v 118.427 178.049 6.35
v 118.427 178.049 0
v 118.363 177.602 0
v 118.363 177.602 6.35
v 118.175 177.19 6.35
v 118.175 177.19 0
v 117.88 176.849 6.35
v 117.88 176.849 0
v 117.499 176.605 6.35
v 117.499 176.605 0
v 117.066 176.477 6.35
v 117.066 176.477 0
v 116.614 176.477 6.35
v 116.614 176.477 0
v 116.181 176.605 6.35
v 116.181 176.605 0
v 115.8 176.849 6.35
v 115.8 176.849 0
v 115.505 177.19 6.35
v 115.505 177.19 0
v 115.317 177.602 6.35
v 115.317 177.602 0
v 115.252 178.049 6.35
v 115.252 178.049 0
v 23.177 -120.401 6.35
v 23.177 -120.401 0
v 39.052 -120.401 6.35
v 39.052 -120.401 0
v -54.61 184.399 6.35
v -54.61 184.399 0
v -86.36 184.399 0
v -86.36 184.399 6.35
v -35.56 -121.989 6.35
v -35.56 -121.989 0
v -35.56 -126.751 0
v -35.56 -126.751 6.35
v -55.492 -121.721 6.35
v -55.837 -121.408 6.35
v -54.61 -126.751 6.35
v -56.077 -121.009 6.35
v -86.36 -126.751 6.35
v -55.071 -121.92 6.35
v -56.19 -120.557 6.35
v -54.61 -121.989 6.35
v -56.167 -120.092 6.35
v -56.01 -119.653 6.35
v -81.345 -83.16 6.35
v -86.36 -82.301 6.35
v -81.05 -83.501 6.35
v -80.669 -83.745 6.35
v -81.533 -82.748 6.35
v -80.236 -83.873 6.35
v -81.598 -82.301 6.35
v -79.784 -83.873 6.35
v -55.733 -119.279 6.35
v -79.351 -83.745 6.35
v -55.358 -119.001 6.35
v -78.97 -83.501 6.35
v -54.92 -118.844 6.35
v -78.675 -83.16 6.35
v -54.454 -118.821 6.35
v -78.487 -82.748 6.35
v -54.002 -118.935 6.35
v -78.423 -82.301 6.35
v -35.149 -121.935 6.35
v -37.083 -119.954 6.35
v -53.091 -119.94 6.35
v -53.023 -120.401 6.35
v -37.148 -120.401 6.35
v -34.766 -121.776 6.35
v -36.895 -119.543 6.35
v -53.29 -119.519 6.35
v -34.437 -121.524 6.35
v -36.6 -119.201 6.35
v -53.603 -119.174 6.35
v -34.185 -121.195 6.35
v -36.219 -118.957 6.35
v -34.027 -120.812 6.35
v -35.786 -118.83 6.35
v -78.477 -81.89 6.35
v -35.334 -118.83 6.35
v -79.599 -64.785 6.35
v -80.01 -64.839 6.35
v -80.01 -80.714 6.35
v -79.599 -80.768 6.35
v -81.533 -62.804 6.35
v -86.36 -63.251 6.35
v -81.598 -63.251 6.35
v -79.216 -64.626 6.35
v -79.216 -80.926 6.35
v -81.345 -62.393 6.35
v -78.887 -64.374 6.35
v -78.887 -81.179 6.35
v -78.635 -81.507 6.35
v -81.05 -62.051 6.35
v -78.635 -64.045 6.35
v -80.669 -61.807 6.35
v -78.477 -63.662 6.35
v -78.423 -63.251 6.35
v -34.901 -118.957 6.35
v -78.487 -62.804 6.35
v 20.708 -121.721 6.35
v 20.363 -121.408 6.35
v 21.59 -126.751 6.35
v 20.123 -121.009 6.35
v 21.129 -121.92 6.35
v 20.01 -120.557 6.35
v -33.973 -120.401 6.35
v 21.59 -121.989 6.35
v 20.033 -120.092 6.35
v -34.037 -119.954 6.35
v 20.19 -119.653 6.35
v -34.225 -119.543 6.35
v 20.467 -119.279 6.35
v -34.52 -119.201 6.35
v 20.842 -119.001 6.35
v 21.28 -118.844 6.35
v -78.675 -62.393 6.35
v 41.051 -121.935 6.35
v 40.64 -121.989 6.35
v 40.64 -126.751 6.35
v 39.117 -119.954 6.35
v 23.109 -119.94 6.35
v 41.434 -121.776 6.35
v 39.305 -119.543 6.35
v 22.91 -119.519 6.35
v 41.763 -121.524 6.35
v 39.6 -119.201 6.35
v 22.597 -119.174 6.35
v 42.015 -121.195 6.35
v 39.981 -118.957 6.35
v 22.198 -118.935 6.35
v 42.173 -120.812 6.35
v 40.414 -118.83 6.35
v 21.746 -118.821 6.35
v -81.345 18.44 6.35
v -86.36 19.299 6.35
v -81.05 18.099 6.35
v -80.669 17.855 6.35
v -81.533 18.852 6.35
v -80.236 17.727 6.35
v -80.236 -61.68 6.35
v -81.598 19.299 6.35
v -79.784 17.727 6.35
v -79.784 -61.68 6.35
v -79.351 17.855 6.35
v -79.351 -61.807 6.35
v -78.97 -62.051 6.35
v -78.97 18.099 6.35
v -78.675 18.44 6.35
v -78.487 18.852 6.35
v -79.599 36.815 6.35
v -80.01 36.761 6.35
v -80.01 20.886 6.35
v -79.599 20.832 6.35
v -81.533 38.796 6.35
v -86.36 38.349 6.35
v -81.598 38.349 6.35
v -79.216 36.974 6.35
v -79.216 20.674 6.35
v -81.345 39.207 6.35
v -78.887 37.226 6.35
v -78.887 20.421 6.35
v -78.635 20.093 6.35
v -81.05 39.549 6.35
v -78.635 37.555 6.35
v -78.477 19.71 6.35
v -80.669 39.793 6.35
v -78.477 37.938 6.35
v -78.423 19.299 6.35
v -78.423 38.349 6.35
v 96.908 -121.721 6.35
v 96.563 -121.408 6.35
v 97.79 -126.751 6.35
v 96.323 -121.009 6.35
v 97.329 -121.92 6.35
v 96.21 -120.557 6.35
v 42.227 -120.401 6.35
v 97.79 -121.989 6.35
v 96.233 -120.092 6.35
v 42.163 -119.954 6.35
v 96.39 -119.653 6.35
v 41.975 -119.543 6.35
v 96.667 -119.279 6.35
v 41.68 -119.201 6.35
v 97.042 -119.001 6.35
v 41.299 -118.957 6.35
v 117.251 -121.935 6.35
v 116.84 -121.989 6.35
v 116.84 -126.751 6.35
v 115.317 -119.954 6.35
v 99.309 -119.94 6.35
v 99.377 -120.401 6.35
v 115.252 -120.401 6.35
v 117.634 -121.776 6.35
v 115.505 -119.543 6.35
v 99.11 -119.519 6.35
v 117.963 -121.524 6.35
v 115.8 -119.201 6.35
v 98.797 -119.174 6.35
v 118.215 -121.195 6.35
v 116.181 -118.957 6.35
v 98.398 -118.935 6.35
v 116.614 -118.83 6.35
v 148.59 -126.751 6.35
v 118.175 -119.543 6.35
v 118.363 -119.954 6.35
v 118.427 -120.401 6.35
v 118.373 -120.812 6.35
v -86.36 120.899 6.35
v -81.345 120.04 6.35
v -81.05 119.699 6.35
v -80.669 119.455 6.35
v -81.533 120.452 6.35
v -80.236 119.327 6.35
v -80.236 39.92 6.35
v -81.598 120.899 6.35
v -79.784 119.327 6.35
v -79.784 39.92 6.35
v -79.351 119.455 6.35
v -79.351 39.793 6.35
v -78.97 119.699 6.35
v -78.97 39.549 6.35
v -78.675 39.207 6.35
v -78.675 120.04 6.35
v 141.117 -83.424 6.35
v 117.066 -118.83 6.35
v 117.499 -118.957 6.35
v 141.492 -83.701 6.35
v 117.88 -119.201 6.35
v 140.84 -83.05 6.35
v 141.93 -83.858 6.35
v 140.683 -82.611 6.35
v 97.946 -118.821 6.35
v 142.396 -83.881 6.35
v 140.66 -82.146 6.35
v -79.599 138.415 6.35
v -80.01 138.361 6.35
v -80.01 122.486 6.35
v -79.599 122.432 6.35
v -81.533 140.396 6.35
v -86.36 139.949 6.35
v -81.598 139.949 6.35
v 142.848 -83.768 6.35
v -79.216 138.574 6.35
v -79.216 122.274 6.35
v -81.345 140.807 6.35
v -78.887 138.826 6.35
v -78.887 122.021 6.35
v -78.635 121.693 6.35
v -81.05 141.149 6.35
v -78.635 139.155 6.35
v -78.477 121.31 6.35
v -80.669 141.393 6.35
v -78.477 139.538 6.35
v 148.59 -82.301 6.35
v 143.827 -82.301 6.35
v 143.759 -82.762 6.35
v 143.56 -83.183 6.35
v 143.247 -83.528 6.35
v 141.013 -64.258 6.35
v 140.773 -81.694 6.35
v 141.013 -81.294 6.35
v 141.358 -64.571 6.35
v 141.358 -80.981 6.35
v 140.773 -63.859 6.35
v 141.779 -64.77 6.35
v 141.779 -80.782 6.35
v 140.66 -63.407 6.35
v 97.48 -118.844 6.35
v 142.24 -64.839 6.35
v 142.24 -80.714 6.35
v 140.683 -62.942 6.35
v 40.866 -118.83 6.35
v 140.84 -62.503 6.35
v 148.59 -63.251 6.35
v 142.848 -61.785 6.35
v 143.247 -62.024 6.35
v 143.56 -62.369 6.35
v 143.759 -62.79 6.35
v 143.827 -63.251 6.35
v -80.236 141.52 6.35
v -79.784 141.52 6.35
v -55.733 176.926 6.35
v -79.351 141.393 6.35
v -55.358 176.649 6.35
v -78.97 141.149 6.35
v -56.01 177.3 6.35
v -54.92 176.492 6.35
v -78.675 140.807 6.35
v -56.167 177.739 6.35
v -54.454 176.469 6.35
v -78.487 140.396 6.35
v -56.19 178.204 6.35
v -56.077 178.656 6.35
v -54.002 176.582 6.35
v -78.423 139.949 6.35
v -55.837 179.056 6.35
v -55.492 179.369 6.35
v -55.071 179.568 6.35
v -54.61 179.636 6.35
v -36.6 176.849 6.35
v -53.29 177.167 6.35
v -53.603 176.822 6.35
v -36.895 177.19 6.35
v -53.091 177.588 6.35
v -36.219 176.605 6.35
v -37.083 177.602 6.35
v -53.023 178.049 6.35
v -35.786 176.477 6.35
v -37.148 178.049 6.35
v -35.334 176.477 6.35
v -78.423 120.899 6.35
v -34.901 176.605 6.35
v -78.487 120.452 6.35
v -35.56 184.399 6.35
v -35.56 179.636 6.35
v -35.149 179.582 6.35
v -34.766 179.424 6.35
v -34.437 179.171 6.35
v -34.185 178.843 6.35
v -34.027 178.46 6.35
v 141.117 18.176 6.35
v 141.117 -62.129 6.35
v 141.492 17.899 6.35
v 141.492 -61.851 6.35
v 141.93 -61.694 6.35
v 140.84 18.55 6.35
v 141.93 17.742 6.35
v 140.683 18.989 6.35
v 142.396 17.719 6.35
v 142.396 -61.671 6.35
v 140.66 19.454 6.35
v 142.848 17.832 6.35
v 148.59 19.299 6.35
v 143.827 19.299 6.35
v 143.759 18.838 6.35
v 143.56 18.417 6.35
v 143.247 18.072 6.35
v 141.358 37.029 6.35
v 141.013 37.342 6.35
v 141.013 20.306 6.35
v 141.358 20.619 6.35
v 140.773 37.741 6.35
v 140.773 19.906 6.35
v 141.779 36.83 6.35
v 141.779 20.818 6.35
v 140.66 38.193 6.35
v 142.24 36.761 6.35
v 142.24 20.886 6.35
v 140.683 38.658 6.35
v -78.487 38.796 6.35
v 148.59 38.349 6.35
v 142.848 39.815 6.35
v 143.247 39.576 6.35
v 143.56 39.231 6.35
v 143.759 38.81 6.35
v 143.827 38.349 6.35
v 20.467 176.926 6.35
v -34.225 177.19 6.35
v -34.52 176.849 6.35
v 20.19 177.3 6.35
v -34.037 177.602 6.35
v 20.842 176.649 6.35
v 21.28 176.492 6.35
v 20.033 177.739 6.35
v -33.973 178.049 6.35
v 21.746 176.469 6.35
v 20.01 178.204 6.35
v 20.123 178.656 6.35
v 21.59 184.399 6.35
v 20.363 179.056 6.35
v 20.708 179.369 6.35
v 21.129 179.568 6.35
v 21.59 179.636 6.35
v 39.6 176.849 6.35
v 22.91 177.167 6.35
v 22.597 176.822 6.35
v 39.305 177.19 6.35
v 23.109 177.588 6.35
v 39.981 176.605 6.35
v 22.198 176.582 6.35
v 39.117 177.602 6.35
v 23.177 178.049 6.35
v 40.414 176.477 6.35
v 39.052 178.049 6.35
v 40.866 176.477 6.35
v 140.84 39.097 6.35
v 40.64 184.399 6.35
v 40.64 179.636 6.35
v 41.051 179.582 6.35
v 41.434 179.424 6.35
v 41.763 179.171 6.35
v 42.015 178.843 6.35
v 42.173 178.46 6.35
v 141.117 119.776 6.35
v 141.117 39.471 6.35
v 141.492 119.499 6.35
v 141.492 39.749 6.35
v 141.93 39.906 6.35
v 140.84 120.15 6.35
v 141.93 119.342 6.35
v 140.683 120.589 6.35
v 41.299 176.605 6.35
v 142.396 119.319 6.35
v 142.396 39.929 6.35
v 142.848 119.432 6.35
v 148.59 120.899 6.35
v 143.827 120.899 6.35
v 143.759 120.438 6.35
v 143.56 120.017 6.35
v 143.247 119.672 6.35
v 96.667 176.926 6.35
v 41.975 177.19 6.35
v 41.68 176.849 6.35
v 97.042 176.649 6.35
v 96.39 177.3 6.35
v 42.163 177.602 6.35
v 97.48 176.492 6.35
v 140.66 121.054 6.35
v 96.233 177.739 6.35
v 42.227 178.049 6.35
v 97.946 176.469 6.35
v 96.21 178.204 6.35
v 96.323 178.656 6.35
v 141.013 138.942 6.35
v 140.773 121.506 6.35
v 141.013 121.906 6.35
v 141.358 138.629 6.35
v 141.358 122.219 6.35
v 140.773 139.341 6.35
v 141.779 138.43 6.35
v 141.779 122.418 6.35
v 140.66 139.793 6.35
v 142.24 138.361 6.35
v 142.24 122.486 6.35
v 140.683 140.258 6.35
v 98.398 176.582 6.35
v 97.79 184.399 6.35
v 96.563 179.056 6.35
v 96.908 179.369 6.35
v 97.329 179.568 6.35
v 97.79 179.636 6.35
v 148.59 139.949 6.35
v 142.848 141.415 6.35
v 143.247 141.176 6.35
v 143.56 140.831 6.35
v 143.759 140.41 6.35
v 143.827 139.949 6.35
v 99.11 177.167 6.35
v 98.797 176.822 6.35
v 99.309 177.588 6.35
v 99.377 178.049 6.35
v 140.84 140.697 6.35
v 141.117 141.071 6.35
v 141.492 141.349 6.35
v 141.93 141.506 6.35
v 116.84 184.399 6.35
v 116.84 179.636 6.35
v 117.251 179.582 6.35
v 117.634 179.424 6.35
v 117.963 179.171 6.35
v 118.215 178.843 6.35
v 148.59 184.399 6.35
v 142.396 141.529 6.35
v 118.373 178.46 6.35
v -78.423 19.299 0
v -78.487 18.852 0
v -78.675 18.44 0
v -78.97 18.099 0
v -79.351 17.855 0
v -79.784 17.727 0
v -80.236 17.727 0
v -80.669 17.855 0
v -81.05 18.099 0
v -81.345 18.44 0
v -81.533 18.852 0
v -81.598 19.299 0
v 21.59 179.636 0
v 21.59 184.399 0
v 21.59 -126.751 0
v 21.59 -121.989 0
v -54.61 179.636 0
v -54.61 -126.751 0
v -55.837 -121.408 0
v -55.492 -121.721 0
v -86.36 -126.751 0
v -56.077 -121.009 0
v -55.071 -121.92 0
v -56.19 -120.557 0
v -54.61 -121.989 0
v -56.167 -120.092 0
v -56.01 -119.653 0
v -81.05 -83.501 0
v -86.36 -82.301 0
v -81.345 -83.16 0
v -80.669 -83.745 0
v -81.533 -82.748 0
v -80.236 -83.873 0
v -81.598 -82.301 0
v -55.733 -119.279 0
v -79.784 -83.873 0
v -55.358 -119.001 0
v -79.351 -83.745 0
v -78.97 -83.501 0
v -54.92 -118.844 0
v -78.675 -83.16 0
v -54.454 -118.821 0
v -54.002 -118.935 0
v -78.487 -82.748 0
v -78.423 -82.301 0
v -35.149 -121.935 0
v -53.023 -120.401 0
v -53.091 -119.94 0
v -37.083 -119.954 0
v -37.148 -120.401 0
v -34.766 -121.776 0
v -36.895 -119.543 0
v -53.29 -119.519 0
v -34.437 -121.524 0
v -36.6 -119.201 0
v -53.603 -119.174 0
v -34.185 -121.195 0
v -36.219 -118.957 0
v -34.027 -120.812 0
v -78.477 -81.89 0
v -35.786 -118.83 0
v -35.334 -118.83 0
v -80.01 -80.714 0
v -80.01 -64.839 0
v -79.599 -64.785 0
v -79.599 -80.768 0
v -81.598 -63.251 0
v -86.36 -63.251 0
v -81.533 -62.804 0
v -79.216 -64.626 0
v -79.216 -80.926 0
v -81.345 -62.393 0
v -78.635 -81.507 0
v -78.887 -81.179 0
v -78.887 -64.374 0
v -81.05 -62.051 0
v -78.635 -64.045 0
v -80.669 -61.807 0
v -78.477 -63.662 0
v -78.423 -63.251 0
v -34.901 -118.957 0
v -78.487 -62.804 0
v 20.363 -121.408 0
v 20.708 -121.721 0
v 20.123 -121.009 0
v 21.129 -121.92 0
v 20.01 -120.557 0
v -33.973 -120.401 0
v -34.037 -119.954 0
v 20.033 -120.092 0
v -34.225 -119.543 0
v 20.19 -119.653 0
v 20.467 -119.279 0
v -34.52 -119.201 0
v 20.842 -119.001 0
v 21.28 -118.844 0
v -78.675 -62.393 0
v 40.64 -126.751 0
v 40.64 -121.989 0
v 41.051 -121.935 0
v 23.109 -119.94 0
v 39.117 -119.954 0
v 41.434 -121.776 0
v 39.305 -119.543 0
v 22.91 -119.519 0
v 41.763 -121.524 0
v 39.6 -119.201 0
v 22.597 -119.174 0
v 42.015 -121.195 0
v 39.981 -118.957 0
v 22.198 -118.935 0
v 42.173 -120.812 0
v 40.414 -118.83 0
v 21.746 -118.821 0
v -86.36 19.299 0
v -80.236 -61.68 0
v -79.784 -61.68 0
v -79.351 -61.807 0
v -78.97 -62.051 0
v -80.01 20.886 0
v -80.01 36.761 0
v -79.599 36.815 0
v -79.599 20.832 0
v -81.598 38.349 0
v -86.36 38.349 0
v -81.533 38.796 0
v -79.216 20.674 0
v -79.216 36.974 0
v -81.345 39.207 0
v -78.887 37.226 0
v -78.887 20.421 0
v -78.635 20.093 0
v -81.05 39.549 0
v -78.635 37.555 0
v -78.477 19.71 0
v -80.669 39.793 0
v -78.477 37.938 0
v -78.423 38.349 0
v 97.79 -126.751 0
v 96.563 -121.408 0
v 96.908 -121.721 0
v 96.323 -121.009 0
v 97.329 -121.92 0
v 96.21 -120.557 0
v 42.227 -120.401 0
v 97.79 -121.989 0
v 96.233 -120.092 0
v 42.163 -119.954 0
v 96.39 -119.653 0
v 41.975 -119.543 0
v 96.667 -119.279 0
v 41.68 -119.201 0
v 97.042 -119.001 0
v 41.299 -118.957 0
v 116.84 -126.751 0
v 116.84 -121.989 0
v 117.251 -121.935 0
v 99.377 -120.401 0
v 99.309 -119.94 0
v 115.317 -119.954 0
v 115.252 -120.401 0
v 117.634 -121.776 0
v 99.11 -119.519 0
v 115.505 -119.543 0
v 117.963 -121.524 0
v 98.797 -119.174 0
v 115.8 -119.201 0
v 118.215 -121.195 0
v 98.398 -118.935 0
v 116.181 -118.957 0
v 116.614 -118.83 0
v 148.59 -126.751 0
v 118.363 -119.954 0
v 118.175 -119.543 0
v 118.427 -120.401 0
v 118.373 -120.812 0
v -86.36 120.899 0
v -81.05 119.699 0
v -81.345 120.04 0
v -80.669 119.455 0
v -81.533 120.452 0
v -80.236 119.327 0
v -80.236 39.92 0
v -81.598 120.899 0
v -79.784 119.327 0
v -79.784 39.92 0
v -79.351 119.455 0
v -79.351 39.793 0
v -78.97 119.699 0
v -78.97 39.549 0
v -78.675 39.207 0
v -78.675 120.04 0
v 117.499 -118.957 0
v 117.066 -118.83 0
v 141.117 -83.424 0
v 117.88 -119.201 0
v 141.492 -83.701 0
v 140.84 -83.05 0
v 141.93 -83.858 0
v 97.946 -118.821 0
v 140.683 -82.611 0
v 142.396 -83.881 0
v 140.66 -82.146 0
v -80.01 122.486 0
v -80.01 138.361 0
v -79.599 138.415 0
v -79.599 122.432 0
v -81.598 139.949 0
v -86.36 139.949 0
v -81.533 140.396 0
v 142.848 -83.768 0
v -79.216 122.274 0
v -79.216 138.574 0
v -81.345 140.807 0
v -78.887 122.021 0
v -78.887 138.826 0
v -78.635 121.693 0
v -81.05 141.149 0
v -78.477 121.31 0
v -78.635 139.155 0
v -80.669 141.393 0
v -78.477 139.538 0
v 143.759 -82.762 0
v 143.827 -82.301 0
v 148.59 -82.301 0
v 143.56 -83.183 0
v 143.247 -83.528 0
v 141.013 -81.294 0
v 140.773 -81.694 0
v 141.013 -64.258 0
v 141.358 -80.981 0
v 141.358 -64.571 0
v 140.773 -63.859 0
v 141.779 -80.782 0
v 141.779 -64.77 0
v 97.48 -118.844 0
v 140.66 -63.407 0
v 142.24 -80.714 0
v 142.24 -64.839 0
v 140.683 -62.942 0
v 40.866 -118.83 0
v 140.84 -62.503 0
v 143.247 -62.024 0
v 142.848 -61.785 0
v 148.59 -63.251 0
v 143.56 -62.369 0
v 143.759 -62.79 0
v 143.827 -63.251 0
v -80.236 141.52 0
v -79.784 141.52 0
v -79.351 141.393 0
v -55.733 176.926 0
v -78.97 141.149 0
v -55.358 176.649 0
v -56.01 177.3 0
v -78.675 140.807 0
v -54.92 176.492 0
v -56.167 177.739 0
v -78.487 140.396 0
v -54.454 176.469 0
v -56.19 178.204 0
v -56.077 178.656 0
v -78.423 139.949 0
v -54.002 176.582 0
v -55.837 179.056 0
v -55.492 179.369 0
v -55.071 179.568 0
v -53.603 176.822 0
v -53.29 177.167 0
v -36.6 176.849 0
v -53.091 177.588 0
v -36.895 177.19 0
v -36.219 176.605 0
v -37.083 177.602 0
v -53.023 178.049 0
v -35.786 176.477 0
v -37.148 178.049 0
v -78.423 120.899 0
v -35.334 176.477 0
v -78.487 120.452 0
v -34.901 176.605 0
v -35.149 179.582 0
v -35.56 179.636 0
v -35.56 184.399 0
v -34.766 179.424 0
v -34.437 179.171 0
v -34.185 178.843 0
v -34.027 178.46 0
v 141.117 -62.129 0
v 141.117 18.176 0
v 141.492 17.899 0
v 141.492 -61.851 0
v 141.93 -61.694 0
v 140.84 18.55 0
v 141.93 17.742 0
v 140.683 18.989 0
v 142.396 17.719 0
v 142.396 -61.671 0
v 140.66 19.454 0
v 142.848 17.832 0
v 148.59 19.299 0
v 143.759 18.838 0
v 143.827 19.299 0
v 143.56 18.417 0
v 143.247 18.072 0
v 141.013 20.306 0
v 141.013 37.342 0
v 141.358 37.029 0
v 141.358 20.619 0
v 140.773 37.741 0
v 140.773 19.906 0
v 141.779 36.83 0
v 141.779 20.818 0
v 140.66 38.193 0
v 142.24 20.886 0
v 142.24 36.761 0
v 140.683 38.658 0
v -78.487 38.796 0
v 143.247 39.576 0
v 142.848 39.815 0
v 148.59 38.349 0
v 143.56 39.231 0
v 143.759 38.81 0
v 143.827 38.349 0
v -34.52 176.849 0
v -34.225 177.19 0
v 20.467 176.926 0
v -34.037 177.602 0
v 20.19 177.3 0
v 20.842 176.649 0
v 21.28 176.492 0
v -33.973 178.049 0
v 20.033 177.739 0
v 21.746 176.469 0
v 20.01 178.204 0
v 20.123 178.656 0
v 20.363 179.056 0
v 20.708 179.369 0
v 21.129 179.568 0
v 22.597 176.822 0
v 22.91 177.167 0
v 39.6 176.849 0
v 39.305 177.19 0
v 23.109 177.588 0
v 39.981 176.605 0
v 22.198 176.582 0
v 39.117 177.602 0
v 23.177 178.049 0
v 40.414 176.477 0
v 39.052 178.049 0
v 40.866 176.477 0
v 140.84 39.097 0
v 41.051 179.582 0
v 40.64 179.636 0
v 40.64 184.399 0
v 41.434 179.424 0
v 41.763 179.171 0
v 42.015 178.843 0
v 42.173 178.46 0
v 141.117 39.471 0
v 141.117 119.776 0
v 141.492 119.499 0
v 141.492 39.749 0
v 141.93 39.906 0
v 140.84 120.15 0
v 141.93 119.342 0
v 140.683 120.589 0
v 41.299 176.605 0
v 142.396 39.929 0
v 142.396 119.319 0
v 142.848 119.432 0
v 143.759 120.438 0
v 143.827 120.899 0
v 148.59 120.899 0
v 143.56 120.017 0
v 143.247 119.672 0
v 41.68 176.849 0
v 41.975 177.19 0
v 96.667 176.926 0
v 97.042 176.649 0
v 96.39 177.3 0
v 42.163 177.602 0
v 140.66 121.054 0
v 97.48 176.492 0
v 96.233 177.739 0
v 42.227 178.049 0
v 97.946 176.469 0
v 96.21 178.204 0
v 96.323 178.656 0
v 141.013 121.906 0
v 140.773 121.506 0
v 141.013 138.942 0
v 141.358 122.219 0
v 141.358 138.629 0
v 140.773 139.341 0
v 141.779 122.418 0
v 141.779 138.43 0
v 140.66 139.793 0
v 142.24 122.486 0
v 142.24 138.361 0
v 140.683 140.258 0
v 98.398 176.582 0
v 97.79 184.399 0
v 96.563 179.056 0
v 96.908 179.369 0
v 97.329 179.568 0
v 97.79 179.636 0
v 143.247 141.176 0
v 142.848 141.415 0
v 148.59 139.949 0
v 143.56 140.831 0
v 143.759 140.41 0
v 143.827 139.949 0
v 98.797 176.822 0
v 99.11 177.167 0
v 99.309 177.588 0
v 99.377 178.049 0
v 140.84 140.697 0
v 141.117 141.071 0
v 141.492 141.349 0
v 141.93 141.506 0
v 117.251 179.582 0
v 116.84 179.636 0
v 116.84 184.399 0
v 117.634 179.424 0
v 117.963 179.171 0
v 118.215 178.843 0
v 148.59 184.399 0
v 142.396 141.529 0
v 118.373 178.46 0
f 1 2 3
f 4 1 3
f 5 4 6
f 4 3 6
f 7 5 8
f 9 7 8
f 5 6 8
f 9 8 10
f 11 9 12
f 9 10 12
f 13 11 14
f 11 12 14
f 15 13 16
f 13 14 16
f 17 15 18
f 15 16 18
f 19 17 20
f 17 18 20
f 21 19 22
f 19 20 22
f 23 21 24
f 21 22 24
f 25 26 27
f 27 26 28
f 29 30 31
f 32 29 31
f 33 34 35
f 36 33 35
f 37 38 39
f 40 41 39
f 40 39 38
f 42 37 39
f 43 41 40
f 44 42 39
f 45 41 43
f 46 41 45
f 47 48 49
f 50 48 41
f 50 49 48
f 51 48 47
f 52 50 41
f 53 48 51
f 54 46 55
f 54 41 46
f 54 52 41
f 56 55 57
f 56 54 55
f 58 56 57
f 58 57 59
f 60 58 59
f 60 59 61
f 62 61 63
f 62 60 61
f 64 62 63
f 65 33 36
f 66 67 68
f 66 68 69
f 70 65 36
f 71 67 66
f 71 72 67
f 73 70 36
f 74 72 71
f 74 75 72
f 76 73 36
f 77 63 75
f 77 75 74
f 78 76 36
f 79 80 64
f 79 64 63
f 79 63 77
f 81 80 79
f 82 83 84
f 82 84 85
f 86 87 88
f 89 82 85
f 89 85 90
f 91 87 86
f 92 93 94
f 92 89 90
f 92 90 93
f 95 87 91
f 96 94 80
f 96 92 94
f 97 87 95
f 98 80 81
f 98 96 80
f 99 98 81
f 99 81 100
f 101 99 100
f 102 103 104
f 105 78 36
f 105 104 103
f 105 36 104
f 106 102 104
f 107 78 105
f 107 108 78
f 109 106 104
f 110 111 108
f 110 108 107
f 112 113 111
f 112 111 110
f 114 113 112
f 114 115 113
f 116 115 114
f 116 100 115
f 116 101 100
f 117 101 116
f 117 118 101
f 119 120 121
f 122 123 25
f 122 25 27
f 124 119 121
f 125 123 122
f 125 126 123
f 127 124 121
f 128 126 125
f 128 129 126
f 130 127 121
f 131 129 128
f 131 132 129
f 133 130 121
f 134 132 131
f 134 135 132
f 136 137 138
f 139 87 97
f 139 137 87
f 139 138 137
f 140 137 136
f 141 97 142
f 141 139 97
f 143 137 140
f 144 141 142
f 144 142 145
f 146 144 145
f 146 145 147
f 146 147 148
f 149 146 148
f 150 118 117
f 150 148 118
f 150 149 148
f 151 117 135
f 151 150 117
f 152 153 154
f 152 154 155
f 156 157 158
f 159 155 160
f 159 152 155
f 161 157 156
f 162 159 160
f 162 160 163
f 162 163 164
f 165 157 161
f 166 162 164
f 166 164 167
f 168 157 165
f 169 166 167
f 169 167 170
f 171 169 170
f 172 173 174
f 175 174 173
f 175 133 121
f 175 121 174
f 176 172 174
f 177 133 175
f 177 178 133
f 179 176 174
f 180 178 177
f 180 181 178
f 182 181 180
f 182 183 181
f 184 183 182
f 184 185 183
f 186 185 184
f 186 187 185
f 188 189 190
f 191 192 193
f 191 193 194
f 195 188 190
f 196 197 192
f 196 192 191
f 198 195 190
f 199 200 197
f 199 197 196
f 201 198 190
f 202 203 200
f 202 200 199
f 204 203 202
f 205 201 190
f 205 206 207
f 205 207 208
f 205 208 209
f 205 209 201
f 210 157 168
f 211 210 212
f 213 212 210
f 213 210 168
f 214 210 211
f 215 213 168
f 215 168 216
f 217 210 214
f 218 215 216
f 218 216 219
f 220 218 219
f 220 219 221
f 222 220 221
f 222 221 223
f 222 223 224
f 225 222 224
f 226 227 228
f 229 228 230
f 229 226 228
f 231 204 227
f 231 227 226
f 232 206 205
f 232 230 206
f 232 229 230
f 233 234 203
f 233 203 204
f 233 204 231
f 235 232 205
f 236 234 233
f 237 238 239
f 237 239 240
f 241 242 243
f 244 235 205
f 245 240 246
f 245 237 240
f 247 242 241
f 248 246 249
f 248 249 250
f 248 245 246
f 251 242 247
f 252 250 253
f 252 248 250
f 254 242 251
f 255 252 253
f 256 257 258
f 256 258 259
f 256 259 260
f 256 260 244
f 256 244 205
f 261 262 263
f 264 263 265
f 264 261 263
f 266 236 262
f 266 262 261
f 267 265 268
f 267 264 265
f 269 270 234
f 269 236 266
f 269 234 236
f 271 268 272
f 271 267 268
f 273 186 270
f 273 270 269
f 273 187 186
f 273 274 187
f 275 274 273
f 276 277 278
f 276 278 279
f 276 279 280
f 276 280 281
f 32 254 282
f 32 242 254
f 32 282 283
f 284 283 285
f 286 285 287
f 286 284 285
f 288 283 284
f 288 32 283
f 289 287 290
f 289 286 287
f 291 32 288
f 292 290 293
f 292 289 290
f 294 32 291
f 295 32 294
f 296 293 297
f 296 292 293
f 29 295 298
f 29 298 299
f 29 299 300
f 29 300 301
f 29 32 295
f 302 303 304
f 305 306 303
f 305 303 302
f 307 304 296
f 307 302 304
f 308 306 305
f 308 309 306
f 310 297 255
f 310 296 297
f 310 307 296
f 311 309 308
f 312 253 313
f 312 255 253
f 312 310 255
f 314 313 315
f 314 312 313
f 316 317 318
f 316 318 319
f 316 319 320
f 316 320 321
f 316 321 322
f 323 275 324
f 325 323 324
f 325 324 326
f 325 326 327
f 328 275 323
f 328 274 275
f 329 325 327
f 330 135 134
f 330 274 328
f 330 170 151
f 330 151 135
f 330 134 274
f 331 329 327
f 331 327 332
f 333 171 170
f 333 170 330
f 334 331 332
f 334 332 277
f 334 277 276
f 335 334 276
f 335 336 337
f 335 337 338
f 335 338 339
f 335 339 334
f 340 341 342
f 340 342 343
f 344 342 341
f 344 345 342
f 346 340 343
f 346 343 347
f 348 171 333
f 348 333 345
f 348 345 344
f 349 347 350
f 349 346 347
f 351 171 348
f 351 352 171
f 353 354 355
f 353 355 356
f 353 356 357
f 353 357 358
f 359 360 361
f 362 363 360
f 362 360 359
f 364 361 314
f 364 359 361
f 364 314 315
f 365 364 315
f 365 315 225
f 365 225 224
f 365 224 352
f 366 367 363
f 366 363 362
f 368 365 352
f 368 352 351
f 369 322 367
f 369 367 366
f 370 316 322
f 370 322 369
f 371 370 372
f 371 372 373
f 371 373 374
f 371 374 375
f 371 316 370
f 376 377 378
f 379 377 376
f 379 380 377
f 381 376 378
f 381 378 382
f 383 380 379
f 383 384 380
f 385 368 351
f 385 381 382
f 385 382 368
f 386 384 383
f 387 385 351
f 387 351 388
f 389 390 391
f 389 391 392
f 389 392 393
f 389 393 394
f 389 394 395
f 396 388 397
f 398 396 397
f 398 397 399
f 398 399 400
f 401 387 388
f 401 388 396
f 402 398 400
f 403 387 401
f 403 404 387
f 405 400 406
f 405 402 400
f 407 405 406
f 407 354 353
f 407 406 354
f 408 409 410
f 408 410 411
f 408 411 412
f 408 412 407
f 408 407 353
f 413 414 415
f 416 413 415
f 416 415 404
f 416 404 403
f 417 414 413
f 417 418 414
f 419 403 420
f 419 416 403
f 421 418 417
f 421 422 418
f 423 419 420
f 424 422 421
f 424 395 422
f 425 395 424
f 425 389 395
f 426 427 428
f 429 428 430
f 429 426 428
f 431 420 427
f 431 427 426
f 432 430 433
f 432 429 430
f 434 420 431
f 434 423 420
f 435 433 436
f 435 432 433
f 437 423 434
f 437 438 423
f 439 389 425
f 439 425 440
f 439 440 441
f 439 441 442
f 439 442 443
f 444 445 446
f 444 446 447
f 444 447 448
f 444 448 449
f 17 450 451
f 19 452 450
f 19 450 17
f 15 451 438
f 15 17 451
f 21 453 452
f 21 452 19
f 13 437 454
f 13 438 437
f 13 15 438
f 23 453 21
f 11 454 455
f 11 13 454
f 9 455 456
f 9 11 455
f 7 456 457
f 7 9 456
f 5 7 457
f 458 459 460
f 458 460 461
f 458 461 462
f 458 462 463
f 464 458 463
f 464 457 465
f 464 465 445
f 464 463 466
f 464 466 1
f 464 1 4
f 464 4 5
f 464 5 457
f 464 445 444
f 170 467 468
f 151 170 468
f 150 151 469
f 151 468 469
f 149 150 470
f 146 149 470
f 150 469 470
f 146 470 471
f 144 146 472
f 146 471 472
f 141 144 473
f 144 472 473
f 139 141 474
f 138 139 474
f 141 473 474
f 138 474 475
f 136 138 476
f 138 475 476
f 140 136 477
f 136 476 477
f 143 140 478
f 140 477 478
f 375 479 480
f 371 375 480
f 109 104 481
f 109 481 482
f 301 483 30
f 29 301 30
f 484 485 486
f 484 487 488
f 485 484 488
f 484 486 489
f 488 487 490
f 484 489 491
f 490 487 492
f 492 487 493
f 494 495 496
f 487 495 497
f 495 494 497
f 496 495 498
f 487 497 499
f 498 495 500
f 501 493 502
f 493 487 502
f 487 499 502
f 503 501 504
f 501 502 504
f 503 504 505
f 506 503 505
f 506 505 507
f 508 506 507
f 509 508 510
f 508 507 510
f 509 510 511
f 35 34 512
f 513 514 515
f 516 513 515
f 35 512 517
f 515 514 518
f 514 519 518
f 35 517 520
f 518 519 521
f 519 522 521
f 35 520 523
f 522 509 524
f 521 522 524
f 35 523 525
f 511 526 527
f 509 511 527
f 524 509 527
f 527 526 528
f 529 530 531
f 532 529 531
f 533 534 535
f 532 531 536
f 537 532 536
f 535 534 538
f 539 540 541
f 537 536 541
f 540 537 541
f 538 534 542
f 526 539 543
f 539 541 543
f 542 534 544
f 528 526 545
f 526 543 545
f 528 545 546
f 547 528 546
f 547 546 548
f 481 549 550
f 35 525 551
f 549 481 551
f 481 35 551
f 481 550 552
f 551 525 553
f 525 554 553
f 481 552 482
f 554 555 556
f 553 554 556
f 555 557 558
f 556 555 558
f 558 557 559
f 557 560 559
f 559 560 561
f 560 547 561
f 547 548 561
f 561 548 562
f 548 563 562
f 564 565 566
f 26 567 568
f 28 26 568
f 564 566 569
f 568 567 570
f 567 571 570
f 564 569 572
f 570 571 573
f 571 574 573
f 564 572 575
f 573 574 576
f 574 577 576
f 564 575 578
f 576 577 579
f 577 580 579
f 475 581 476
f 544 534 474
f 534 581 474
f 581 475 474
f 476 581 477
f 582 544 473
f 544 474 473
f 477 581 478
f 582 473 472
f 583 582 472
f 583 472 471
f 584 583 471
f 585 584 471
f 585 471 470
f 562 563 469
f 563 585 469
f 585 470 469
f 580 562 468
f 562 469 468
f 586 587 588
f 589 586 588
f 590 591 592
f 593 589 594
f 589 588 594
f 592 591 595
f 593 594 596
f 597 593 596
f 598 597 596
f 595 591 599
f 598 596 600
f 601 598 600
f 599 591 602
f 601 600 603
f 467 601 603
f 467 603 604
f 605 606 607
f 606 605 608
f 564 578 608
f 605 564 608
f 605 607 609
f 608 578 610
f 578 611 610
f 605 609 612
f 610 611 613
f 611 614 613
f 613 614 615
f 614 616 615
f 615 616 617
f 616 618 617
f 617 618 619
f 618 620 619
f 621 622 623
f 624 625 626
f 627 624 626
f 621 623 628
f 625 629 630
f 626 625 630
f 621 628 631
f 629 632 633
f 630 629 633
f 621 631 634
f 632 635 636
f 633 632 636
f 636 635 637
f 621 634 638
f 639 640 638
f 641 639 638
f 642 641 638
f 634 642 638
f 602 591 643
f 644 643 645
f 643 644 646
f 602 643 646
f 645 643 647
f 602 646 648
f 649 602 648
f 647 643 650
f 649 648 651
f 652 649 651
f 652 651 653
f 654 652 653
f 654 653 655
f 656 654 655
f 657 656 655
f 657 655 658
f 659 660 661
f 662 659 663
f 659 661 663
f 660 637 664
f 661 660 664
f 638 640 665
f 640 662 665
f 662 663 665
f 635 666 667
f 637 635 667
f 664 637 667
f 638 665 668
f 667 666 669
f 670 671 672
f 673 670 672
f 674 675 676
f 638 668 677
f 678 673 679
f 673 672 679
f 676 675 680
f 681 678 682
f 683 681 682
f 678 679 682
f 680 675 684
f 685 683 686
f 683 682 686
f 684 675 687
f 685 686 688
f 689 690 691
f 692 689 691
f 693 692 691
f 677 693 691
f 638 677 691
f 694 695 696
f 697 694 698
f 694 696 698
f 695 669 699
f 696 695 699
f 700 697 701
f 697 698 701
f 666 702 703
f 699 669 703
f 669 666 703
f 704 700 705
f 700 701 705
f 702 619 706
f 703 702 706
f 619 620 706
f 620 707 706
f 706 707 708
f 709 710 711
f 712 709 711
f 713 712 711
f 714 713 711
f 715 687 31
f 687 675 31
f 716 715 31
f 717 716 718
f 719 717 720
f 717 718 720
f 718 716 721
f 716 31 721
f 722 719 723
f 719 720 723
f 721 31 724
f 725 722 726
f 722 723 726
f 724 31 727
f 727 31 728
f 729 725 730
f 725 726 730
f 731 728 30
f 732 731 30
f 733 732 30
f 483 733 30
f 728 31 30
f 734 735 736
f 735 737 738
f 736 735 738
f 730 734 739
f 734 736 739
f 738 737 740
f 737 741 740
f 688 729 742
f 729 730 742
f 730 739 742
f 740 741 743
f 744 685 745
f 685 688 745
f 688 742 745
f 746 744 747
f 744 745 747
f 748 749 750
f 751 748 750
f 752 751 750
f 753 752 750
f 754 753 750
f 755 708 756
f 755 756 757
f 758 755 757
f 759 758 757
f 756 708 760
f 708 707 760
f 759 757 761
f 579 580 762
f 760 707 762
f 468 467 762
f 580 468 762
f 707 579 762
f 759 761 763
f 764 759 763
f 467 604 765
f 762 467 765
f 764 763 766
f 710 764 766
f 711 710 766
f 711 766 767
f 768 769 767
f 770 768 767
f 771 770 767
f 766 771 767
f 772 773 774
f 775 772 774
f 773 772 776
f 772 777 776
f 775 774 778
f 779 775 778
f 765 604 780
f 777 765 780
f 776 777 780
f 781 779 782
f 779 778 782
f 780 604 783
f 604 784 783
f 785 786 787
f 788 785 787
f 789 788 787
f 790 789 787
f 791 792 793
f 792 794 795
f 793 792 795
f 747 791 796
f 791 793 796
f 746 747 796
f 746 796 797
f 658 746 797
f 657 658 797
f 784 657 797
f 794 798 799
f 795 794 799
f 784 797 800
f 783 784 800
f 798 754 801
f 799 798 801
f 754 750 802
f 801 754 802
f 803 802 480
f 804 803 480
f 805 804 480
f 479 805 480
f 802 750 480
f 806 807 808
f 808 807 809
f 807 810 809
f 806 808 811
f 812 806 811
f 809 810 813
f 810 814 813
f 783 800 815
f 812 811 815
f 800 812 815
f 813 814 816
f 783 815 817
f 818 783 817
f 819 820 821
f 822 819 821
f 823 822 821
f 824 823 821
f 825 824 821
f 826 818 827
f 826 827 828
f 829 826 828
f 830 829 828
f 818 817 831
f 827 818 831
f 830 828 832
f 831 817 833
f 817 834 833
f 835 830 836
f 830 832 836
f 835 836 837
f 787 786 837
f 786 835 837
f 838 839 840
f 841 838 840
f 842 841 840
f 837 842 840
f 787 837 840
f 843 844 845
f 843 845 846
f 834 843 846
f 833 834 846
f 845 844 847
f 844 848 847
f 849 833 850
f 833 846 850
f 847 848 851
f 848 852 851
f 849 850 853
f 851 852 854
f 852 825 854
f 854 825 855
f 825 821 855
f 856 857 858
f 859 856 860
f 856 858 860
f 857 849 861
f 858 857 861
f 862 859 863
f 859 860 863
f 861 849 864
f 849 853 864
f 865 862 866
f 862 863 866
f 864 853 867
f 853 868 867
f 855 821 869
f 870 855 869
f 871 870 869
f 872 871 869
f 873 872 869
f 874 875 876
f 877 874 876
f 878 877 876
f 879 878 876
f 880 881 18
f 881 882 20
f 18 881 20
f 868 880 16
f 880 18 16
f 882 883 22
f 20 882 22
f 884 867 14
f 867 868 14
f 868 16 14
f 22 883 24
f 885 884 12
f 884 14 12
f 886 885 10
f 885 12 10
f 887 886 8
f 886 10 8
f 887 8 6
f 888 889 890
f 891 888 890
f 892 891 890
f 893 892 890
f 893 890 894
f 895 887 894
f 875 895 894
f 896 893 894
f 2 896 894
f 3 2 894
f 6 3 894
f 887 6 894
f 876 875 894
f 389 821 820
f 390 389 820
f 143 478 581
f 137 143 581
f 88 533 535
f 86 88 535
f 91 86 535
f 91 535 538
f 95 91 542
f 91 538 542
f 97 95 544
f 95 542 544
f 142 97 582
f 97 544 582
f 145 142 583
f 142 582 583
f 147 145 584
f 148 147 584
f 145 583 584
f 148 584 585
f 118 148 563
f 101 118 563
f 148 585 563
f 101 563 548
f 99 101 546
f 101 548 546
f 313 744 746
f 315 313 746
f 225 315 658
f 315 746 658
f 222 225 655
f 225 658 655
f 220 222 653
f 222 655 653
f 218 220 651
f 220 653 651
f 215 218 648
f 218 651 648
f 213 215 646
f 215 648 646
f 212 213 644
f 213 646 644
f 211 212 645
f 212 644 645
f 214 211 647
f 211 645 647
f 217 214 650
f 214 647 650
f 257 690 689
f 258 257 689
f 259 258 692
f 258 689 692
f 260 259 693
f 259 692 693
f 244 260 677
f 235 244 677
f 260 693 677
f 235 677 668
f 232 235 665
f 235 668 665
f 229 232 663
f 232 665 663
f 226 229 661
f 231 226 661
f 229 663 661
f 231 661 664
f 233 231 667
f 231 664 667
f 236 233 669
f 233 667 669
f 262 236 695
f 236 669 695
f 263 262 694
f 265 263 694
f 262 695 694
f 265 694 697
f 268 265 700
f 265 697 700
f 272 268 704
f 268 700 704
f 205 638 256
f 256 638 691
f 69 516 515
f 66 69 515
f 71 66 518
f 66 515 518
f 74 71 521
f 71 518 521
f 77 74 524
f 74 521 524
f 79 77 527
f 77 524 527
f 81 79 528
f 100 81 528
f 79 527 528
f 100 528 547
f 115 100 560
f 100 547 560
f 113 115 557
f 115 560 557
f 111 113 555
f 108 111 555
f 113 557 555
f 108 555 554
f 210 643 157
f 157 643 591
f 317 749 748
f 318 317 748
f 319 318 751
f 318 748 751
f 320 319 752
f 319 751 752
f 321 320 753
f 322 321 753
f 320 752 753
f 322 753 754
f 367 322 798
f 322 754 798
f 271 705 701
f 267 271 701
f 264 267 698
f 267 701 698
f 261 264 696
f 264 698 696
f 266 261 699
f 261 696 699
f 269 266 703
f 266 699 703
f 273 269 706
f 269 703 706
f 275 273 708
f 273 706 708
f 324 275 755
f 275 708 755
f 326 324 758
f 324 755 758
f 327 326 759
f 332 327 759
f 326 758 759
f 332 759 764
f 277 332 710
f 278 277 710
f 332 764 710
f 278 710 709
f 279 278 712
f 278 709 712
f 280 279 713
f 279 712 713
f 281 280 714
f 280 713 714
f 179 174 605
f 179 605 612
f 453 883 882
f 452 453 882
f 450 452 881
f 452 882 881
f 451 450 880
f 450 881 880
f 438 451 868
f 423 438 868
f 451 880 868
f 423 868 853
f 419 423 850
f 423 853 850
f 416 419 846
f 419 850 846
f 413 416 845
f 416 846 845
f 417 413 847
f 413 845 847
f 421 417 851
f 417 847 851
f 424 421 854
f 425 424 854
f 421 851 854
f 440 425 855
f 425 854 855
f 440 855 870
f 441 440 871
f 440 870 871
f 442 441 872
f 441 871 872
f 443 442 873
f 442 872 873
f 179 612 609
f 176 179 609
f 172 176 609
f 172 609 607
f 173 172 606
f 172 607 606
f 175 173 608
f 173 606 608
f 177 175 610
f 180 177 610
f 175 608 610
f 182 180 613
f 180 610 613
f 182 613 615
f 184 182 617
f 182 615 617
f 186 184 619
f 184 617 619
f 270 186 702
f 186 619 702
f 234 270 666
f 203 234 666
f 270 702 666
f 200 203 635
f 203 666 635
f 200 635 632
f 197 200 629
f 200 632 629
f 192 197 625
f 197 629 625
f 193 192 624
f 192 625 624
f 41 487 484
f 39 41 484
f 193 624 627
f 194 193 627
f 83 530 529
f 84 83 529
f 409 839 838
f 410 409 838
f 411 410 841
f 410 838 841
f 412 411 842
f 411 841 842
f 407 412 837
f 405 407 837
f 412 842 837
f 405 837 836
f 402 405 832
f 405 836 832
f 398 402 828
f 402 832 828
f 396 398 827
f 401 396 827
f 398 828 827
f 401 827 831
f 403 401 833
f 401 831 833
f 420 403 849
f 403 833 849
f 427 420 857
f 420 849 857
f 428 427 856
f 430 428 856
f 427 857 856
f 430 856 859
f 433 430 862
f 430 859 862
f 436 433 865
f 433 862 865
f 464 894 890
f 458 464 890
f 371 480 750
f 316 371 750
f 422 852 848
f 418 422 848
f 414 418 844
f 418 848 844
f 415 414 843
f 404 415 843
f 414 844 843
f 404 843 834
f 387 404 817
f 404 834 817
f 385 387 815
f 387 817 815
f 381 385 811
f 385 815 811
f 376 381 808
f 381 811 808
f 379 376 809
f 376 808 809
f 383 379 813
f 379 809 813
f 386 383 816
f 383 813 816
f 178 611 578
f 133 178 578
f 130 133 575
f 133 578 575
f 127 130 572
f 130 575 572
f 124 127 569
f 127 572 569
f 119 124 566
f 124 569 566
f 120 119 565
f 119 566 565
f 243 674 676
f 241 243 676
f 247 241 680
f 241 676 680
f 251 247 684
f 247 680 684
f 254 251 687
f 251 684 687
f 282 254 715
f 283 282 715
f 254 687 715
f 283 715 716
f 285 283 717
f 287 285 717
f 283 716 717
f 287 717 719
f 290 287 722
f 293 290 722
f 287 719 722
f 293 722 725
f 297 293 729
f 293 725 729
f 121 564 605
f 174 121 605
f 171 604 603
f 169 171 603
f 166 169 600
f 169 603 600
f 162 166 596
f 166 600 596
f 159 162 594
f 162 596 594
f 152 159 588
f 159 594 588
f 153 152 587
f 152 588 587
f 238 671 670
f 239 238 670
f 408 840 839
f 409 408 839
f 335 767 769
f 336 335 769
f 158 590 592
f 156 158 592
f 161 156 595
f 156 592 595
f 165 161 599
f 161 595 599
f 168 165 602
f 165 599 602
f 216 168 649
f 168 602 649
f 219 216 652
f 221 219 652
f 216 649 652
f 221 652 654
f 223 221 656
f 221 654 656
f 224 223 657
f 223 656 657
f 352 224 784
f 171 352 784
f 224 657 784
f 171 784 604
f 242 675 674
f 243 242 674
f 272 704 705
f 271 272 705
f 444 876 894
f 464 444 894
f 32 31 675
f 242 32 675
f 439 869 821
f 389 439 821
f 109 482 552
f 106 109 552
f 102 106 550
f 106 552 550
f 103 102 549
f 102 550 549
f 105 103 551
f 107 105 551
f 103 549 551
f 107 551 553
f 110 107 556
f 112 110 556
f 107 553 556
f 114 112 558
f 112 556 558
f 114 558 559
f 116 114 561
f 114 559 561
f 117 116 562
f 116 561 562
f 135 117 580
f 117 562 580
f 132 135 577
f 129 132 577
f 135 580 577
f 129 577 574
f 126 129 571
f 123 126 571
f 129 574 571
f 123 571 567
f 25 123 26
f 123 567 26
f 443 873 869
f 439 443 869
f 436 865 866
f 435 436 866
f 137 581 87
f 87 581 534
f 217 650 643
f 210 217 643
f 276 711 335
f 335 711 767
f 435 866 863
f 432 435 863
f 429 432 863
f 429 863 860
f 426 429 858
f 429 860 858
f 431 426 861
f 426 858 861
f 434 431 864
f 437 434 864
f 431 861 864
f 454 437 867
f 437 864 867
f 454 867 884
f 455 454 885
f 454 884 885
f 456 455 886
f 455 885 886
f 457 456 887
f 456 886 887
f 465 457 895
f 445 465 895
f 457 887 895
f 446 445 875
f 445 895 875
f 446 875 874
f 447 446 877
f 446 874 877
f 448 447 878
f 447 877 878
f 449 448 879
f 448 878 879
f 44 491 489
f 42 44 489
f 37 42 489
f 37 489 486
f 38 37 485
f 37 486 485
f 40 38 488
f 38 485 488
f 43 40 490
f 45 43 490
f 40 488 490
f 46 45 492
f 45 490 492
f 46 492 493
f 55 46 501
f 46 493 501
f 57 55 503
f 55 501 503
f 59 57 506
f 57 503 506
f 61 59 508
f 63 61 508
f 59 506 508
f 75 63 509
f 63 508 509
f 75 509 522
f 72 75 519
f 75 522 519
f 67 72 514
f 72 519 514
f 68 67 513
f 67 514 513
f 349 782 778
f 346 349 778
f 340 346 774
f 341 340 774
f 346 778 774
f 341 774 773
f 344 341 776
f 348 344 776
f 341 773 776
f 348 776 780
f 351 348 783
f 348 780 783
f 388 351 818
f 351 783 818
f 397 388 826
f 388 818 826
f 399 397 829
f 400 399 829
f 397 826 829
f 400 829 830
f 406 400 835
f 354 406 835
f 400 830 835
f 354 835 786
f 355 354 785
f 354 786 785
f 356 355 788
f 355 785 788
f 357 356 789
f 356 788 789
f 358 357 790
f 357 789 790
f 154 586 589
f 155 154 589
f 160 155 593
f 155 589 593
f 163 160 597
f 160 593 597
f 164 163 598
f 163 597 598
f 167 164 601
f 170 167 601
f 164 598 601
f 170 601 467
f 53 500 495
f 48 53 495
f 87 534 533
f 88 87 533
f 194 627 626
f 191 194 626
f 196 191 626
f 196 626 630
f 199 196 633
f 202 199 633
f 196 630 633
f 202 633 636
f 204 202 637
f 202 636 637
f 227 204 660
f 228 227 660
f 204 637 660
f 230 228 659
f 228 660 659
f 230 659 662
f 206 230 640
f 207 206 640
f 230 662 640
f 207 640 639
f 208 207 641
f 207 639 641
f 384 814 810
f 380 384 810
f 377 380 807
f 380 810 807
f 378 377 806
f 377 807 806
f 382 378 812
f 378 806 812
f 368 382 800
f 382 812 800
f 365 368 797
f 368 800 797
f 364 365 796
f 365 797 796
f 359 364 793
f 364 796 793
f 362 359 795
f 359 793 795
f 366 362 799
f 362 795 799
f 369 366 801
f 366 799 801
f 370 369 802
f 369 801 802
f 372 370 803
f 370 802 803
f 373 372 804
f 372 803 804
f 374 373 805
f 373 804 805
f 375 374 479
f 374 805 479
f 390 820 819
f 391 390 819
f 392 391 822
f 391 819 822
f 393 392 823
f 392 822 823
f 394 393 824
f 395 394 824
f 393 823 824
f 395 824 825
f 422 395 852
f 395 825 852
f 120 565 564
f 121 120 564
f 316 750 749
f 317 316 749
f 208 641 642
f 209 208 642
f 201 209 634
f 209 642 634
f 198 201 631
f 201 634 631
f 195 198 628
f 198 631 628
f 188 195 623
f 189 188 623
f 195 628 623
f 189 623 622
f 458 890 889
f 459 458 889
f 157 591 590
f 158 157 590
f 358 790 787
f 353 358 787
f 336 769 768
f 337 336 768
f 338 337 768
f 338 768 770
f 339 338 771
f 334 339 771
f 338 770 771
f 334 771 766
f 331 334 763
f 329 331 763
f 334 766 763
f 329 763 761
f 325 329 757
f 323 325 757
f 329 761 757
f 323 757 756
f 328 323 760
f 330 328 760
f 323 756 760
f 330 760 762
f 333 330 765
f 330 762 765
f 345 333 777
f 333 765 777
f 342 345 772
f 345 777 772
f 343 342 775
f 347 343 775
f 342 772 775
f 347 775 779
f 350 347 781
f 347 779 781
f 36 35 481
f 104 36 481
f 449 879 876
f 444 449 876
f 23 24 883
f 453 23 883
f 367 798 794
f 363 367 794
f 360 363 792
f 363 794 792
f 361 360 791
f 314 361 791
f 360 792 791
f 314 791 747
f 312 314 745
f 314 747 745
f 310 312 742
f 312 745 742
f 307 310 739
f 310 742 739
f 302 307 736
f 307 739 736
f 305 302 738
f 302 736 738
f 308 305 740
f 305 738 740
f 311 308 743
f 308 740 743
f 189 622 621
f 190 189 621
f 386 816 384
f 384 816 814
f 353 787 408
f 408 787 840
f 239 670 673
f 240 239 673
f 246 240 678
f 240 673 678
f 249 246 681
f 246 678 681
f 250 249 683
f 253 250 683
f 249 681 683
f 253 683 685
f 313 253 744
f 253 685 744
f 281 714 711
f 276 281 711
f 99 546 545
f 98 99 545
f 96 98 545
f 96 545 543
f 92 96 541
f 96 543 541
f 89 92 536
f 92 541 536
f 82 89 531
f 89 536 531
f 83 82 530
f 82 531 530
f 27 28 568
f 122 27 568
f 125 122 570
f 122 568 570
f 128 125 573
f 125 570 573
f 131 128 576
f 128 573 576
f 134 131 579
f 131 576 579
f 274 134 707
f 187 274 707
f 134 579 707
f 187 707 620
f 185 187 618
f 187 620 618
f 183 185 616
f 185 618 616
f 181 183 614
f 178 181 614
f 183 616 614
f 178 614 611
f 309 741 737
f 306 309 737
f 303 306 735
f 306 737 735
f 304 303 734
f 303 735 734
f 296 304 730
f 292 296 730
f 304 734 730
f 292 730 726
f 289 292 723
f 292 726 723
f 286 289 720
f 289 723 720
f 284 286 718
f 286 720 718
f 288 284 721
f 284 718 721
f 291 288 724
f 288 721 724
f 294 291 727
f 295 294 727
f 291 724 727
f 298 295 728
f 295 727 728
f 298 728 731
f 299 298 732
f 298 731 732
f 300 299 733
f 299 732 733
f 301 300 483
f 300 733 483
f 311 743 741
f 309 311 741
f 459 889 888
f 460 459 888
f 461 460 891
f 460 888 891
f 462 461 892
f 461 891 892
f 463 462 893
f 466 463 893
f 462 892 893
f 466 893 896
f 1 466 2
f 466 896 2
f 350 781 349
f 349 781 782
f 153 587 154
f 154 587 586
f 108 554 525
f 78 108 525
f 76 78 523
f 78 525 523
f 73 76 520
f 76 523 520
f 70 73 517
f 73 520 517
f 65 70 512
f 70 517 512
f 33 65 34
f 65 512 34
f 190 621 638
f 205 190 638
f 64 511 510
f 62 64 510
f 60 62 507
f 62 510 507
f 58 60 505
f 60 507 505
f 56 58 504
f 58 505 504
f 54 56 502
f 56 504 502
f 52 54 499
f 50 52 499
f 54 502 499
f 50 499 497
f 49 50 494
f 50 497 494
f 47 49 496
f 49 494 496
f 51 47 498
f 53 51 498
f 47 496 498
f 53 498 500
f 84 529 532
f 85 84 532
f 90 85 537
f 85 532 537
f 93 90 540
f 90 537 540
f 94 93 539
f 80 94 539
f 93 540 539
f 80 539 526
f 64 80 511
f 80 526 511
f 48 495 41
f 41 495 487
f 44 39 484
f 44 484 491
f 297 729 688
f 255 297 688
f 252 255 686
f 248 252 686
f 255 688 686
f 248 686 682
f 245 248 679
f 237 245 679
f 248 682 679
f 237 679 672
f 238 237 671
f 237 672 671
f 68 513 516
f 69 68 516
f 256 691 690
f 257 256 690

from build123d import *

# Parameters (mm, degrees)
F1_DEPTH = 6.35


with BuildPart() as f1:
    # F0 (on Top) → F1 (new body)
    with BuildSketch(Plane.XY):
        with BuildLine():
            Line((-54.6100006601, 184.3987628429), (-86.3600006601, 184.3987628429))
            Line((-86.3600006601, 184.3987628429), (-86.3600006601, 139.9487628429))
            Line((-86.3600006601, 139.9487628429), (-81.5975006601, 139.9487628429))
            ThreePointArc((-81.5975006601, 139.9487628429), (-80.0100006601, 141.5362628429), (-78.4225006601, 139.9487628429))
            ThreePointArc((-78.4225006601, 139.9487628429), (-78.887468645, 138.8262308277), (-80.0100006601, 138.3612628429))
            Line((-80.0100006601, 138.3612628429), (-80.0100006601, 122.4862628429))
            ThreePointArc((-80.0100006601, 122.4862628429), (-78.887468645, 122.021294858), (-78.4225006601, 120.8987628429))
            ThreePointArc((-78.4225006601, 120.8987628429), (-80.0100006601, 119.3112628429), (-81.5975006601, 120.8987628429))
            Line((-81.5975006601, 120.8987628429), (-86.3600006601, 120.8987628429))
            Line((-86.3600006601, 120.8987628429), (-86.3600006601, 38.3487628429))
            Line((-86.3600006601, 38.3487628429), (-81.5975006601, 38.3487628429))
            ThreePointArc((-81.5975006601, 38.3487628429), (-80.0100006601, 39.9362628429), (-78.4225006601, 38.3487628429))
            ThreePointArc((-78.4225006601, 38.3487628429), (-78.887468645, 37.2262308277), (-80.0100006601, 36.7612628429))
            Line((-80.0100006601, 36.7612628429), (-80.0100006601, 20.8862628429))
            ThreePointArc((-80.0100006601, 20.8862628429), (-78.887468645, 20.421294858), (-78.4225006601, 19.2987628429))
            ThreePointArc((-78.4225006601, 19.2987628429), (-80.0100006601, 17.7112628429), (-81.5975006601, 19.2987628429))
            Line((-81.5975006601, 19.2987628429), (-86.3600006601, 19.2987628429))
            Line((-86.3600006601, 19.2987628429), (-86.3600006601, -63.2512371571))
            Line((-86.3600006601, -63.2512371571), (-81.5975006601, -63.2512371571))
            ThreePointArc((-81.5975006601, -63.2512371571), (-80.0100006601, -61.6637371571), (-78.4225006601, -63.2512371571))
            ThreePointArc((-78.4225006601, -63.2512371571), (-78.887468645, -64.3737691723), (-80.0100006601, -64.8387371571))
            Line((-80.0100006601, -64.8387371571), (-80.0100006601, -80.7137371571))
            ThreePointArc((-80.0100006601, -80.7137371571), (-78.887468645, -81.178705142), (-78.4225006601, -82.3012371571))
            ThreePointArc((-78.4225006601, -82.3012371571), (-80.0100006601, -83.8887371571), (-81.5975006601, -82.3012371571))
            Line((-81.5975006601, -82.3012371571), (-86.3600006601, -82.3012371571))
            Line((-86.3600006601, -82.3012371571), (-86.3600006601, -126.7512371571))
            Line((-86.3600006601, -126.7512371571), (-54.6100006601, -126.7512371571))
            Line((-54.6100006601, -126.7512371571), (-54.6100006601, -121.9887371571))
            ThreePointArc((-54.6100006601, -121.9887371571), (-55.7325326753, -119.278705142), (-53.0225006601, -120.4012371571))
            Line((-53.0225006601, -120.4012371571), (-37.1475006601, -120.4012371571))
            ThreePointArc((-37.1475006601, -120.4012371571), (-35.5600006601, -118.8137371571), (-33.9725006601, -120.4012371571))
            ThreePointArc((-33.9725006601, -120.4012371571), (-34.437468645, -121.5237691723), (-35.5600006601, -121.9887371571))
            Line((-35.5600006601, -121.9887371571), (-35.5600006601, -126.7512371571))
            Line((-35.5600006601, -126.7512371571), (21.5899993399, -126.7512371571))
            Line((21.5899993399, -126.7512371571), (21.5899993399, -121.9887371571))
            ThreePointArc((21.5899993399, -121.9887371571), (20.4674673247, -119.278705142), (23.1774993399, -120.4012371571))
            Line((23.1774993399, -120.4012371571), (39.0524993399, -120.4012371571))
            ThreePointArc((39.0524993399, -120.4012371571), (40.6399993399, -118.8137371571), (42.2274993399, -120.4012371571))
            ThreePointArc((42.2274993399, -120.4012371571), (41.762531355, -121.5237691723), (40.6399993399, -121.9887371571))
            Line((40.6399993399, -121.9887371571), (40.6399993399, -126.7512371571))
            Line((40.6399993399, -126.7512371571), (97.7899993399, -126.7512371571))
            Line((97.7899993399, -126.7512371571), (97.7899993399, -121.9887371571))
            ThreePointArc((97.7899993399, -121.9887371571), (96.6674673247, -119.278705142), (99.3774993399, -120.4012371571))
            Line((99.3774993399, -120.4012371571), (115.2524993399, -120.4012371571))
            ThreePointArc((115.2524993399, -120.4012371571), (116.8399993399, -118.8137371571), (118.4274993399, -120.4012371571))
            ThreePointArc((118.4274993399, -120.4012371571), (117.962531355, -121.5237691723), (116.8399993399, -121.9887371571))
            Line((116.8399993399, -121.9887371571), (116.8399993399, -126.7512371571))
            Line((116.8399993399, -126.7512371571), (148.5899993399, -126.7512371571))
            Line((148.5899993399, -126.7512371571), (148.5899993399, -82.3012371571))
            Line((148.5899993399, -82.3012371571), (143.8274993399, -82.3012371571))
            ThreePointArc((143.8274993399, -82.3012371571), (141.1174673247, -83.4237691723), (142.2399993399, -80.7137371571))
            Line((142.2399993399, -80.7137371571), (142.2399993399, -64.8387371571))
            ThreePointArc((142.2399993399, -64.8387371571), (141.1174673247, -62.128705142), (143.8274993399, -63.2512371571))
            Line((143.8274993399, -63.2512371571), (148.5899993399, -63.2512371571))
            Line((148.5899993399, -63.2512371571), (148.5899993399, 19.2987628429))
            Line((148.5899993399, 19.2987628429), (143.8274993399, 19.2987628429))
            ThreePointArc((143.8274993399, 19.2987628429), (141.1174673247, 18.1762308277), (142.2399993399, 20.8862628429))
            Line((142.2399993399, 20.8862628429), (142.2399993399, 36.7612628429))
            ThreePointArc((142.2399993399, 36.7612628429), (141.1174673247, 39.471294858), (143.8274993399, 38.3487628429))
            Line((143.8274993399, 38.3487628429), (148.5899993399, 38.3487628429))
            Line((148.5899993399, 38.3487628429), (148.5899993399, 120.8987628429))
            Line((148.5899993399, 120.8987628429), (143.8274993399, 120.8987628429))
            ThreePointArc((143.8274993399, 120.8987628429), (141.1174673247, 119.7762308277), (142.2399993399, 122.4862628429))
            Line((142.2399993399, 122.4862628429), (142.2399993399, 138.3612628429))
            ThreePointArc((142.2399993399, 138.3612628429), (141.1174673247, 141.071294858), (143.8274993399, 139.9487628429))
            Line((143.8274993399, 139.9487628429), (148.5899993399, 139.9487628429))
            Line((148.5899993399, 139.9487628429), (148.5899993399, 184.3987628429))
            Line((148.5899993399, 184.3987628429), (116.8399993399, 184.3987628429))
            Line((116.8399993399, 184.3987628429), (116.8399993399, 179.6362628429))
            ThreePointArc((116.8399993399, 179.6362628429), (117.962531355, 179.171294858), (118.4274993399, 178.0487628429))
            ThreePointArc((118.4274993399, 178.0487628429), (116.8399993399, 176.4612628429), (115.2524993399, 178.0487628429))
            Line((115.2524993399, 178.0487628429), (99.3774993399, 178.0487628429))
            ThreePointArc((99.3774993399, 178.0487628429), (96.6674673247, 176.9262308277), (97.7899993399, 179.6362628429))
            Line((97.7899993399, 179.6362628429), (97.7899993399, 184.3987628429))
            Line((97.7899993399, 184.3987628429), (40.6399993399, 184.3987628429))
            Line((40.6399993399, 184.3987628429), (40.6399993399, 179.6362628429))
            ThreePointArc((40.6399993399, 179.6362628429), (41.762531355, 179.171294858), (42.2274993399, 178.0487628429))
            ThreePointArc((42.2274993399, 178.0487628429), (40.6399993399, 176.4612628429), (39.0524993399, 178.0487628429))
            Line((39.0524993399, 178.0487628429), (23.1774993399, 178.0487628429))
            ThreePointArc((23.1774993399, 178.0487628429), (20.4674673247, 176.9262308277), (21.5899993399, 179.6362628429))
            Line((21.5899993399, 179.6362628429), (21.5899993399, 184.3987628429))
            Line((21.5899993399, 184.3987628429), (-35.5600006601, 184.3987628429))
            Line((-35.5600006601, 184.3987628429), (-35.5600006601, 179.6362628429))
            ThreePointArc((-35.5600006601, 179.6362628429), (-34.437468645, 179.171294858), (-33.9725006601, 178.0487628429))
            ThreePointArc((-33.9725006601, 178.0487628429), (-35.5600006601, 176.4612628429), (-37.1475006601, 178.0487628429))
            Line((-37.1475006601, 178.0487628429), (-53.0225006601, 178.0487628429))
            ThreePointArc((-53.0225006601, 178.0487628429), (-55.7325326753, 176.9262308277), (-54.6100006601, 179.6362628429))
            Line((-54.6100006601, 179.6362628429), (-54.6100006601, 184.3987628429))
        make_face()
    extrude(amount=F1_DEPTH)


solid = f1.part
